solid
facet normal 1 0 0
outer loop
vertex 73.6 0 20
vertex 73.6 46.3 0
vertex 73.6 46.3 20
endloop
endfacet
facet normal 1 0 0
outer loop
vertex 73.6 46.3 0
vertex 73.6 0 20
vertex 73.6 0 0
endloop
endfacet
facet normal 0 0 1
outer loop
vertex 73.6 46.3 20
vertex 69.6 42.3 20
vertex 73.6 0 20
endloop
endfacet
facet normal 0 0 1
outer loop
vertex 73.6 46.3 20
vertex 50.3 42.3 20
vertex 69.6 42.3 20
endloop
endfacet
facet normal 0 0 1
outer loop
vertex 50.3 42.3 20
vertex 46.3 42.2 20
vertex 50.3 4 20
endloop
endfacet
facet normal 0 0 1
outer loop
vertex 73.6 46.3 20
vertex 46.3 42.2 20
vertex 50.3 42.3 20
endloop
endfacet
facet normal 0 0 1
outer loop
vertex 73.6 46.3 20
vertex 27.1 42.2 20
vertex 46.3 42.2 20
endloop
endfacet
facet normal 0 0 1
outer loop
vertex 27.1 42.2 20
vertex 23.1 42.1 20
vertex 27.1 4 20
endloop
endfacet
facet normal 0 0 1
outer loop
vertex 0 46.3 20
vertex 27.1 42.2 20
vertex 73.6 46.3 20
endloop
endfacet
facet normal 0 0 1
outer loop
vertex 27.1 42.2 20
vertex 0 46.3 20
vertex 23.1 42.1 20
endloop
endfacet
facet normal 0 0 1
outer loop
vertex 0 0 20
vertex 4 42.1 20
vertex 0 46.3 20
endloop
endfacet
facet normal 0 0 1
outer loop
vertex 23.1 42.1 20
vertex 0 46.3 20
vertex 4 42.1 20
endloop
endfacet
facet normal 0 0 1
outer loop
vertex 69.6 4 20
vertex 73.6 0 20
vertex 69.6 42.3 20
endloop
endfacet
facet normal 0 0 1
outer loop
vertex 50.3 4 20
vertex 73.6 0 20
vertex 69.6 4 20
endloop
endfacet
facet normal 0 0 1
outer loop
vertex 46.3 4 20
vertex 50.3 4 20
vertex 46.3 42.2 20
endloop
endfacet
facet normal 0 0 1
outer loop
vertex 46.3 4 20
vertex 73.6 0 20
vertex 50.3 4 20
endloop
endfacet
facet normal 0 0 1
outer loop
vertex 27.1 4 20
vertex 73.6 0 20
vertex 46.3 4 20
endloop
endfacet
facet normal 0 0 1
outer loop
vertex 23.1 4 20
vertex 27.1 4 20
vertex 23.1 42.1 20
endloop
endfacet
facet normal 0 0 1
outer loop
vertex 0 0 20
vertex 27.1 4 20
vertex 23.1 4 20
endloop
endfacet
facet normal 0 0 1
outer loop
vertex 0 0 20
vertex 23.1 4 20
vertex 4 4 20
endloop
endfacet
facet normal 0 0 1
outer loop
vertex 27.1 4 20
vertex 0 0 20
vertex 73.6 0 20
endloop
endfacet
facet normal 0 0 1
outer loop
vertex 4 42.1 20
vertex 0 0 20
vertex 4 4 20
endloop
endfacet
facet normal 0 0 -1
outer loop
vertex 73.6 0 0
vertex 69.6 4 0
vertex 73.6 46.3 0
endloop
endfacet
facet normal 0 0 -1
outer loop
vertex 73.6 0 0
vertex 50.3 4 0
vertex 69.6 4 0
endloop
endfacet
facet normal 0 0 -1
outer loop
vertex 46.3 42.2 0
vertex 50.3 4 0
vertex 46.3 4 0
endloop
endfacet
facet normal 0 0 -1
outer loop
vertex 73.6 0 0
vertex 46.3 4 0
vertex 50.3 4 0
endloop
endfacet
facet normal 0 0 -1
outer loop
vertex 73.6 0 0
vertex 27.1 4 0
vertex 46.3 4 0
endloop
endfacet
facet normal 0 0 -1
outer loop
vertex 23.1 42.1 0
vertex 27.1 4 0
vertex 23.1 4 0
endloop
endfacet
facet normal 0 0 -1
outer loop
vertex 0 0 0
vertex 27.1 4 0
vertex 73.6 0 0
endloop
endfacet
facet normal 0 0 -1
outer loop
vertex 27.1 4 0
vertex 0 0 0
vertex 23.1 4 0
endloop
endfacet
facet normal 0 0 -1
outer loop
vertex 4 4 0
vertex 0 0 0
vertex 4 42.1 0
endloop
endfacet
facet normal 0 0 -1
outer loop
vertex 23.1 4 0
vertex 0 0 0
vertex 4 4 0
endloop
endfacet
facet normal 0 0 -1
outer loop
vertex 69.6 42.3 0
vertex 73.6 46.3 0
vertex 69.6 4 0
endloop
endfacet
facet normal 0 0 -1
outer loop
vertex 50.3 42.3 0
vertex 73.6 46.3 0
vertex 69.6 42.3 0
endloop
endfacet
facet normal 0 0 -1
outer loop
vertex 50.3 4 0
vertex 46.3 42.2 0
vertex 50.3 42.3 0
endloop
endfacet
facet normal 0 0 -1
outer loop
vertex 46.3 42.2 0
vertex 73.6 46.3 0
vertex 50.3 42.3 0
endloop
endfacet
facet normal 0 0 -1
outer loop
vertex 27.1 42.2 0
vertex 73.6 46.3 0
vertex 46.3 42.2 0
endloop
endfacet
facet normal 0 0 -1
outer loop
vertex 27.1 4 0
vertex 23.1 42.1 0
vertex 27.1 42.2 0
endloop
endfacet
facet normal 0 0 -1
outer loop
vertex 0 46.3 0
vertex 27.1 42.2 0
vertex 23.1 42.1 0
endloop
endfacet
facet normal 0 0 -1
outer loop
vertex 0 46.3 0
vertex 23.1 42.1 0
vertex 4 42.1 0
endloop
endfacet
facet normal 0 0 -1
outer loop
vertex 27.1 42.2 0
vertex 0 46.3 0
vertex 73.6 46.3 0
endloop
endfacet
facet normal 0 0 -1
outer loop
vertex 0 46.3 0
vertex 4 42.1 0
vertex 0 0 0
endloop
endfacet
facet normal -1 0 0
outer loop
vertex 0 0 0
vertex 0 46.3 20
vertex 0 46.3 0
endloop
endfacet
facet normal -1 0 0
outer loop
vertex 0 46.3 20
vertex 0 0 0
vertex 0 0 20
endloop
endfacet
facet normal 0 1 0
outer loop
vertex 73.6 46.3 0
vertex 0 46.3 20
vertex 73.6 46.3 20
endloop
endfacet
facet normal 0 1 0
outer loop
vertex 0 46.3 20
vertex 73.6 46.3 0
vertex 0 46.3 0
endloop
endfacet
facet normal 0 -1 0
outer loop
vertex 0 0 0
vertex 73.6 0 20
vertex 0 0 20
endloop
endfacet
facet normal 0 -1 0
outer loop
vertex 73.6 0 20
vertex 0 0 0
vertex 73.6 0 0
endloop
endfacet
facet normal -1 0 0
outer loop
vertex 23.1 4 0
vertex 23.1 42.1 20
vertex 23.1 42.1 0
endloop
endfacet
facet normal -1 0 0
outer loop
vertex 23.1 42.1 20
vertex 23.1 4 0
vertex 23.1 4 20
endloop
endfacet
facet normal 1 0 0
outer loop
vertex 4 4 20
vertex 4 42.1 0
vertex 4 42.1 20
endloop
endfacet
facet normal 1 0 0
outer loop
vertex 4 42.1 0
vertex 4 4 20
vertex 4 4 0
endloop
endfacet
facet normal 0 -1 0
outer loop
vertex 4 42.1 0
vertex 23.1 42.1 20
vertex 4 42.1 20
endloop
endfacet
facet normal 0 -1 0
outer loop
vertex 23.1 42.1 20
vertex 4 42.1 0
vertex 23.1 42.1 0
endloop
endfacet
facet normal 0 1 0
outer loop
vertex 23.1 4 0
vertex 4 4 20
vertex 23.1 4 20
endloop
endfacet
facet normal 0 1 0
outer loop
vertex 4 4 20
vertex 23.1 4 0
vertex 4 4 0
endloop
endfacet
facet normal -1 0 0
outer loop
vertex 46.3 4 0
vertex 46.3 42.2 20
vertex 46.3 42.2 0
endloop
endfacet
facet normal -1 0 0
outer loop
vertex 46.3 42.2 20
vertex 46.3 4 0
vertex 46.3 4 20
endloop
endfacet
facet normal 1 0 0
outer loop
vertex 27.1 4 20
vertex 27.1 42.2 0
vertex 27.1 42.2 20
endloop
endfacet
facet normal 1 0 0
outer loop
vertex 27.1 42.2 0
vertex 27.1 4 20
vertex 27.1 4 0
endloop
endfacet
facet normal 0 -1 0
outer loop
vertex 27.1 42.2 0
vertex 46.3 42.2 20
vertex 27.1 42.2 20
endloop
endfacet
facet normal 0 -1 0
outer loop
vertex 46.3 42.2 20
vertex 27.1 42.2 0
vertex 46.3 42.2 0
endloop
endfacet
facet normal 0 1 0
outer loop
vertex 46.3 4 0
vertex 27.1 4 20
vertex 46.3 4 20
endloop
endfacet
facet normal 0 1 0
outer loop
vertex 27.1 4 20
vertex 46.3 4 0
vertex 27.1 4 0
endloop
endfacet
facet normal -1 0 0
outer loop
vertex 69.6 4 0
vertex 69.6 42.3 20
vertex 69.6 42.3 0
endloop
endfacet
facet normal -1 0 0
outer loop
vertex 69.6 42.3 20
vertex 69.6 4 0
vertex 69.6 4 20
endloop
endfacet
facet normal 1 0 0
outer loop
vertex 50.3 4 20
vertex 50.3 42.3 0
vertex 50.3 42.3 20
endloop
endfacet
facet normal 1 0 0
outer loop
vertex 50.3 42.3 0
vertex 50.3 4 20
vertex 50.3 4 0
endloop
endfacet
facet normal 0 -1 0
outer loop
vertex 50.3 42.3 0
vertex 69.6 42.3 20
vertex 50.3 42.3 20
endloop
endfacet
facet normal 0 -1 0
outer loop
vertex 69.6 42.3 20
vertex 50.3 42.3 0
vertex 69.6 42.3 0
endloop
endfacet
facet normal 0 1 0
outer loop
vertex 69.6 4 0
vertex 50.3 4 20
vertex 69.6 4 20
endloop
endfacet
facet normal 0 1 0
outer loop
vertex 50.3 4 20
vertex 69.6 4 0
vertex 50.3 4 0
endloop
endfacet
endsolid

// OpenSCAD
union() {
	difference() {
		difference() {
			difference() {
				cube(size = [73.6000000000, 46.3000000000, 20]);
				translate(v = [4, 4, 0]) {
					cube(size = [19.1000000000, 38.1000000000, 20]);
				}
			}
			translate(v = [27.1000000000, 4, 0]) {
				cube(size = [19.2000000000, 38.2000000000, 20]);
			}
		}
		translate(v = [50.3000000000, 4, 0]) {
			cube(size = [19.3000000000, 38.3000000000, 20]);
		}
	}
}
